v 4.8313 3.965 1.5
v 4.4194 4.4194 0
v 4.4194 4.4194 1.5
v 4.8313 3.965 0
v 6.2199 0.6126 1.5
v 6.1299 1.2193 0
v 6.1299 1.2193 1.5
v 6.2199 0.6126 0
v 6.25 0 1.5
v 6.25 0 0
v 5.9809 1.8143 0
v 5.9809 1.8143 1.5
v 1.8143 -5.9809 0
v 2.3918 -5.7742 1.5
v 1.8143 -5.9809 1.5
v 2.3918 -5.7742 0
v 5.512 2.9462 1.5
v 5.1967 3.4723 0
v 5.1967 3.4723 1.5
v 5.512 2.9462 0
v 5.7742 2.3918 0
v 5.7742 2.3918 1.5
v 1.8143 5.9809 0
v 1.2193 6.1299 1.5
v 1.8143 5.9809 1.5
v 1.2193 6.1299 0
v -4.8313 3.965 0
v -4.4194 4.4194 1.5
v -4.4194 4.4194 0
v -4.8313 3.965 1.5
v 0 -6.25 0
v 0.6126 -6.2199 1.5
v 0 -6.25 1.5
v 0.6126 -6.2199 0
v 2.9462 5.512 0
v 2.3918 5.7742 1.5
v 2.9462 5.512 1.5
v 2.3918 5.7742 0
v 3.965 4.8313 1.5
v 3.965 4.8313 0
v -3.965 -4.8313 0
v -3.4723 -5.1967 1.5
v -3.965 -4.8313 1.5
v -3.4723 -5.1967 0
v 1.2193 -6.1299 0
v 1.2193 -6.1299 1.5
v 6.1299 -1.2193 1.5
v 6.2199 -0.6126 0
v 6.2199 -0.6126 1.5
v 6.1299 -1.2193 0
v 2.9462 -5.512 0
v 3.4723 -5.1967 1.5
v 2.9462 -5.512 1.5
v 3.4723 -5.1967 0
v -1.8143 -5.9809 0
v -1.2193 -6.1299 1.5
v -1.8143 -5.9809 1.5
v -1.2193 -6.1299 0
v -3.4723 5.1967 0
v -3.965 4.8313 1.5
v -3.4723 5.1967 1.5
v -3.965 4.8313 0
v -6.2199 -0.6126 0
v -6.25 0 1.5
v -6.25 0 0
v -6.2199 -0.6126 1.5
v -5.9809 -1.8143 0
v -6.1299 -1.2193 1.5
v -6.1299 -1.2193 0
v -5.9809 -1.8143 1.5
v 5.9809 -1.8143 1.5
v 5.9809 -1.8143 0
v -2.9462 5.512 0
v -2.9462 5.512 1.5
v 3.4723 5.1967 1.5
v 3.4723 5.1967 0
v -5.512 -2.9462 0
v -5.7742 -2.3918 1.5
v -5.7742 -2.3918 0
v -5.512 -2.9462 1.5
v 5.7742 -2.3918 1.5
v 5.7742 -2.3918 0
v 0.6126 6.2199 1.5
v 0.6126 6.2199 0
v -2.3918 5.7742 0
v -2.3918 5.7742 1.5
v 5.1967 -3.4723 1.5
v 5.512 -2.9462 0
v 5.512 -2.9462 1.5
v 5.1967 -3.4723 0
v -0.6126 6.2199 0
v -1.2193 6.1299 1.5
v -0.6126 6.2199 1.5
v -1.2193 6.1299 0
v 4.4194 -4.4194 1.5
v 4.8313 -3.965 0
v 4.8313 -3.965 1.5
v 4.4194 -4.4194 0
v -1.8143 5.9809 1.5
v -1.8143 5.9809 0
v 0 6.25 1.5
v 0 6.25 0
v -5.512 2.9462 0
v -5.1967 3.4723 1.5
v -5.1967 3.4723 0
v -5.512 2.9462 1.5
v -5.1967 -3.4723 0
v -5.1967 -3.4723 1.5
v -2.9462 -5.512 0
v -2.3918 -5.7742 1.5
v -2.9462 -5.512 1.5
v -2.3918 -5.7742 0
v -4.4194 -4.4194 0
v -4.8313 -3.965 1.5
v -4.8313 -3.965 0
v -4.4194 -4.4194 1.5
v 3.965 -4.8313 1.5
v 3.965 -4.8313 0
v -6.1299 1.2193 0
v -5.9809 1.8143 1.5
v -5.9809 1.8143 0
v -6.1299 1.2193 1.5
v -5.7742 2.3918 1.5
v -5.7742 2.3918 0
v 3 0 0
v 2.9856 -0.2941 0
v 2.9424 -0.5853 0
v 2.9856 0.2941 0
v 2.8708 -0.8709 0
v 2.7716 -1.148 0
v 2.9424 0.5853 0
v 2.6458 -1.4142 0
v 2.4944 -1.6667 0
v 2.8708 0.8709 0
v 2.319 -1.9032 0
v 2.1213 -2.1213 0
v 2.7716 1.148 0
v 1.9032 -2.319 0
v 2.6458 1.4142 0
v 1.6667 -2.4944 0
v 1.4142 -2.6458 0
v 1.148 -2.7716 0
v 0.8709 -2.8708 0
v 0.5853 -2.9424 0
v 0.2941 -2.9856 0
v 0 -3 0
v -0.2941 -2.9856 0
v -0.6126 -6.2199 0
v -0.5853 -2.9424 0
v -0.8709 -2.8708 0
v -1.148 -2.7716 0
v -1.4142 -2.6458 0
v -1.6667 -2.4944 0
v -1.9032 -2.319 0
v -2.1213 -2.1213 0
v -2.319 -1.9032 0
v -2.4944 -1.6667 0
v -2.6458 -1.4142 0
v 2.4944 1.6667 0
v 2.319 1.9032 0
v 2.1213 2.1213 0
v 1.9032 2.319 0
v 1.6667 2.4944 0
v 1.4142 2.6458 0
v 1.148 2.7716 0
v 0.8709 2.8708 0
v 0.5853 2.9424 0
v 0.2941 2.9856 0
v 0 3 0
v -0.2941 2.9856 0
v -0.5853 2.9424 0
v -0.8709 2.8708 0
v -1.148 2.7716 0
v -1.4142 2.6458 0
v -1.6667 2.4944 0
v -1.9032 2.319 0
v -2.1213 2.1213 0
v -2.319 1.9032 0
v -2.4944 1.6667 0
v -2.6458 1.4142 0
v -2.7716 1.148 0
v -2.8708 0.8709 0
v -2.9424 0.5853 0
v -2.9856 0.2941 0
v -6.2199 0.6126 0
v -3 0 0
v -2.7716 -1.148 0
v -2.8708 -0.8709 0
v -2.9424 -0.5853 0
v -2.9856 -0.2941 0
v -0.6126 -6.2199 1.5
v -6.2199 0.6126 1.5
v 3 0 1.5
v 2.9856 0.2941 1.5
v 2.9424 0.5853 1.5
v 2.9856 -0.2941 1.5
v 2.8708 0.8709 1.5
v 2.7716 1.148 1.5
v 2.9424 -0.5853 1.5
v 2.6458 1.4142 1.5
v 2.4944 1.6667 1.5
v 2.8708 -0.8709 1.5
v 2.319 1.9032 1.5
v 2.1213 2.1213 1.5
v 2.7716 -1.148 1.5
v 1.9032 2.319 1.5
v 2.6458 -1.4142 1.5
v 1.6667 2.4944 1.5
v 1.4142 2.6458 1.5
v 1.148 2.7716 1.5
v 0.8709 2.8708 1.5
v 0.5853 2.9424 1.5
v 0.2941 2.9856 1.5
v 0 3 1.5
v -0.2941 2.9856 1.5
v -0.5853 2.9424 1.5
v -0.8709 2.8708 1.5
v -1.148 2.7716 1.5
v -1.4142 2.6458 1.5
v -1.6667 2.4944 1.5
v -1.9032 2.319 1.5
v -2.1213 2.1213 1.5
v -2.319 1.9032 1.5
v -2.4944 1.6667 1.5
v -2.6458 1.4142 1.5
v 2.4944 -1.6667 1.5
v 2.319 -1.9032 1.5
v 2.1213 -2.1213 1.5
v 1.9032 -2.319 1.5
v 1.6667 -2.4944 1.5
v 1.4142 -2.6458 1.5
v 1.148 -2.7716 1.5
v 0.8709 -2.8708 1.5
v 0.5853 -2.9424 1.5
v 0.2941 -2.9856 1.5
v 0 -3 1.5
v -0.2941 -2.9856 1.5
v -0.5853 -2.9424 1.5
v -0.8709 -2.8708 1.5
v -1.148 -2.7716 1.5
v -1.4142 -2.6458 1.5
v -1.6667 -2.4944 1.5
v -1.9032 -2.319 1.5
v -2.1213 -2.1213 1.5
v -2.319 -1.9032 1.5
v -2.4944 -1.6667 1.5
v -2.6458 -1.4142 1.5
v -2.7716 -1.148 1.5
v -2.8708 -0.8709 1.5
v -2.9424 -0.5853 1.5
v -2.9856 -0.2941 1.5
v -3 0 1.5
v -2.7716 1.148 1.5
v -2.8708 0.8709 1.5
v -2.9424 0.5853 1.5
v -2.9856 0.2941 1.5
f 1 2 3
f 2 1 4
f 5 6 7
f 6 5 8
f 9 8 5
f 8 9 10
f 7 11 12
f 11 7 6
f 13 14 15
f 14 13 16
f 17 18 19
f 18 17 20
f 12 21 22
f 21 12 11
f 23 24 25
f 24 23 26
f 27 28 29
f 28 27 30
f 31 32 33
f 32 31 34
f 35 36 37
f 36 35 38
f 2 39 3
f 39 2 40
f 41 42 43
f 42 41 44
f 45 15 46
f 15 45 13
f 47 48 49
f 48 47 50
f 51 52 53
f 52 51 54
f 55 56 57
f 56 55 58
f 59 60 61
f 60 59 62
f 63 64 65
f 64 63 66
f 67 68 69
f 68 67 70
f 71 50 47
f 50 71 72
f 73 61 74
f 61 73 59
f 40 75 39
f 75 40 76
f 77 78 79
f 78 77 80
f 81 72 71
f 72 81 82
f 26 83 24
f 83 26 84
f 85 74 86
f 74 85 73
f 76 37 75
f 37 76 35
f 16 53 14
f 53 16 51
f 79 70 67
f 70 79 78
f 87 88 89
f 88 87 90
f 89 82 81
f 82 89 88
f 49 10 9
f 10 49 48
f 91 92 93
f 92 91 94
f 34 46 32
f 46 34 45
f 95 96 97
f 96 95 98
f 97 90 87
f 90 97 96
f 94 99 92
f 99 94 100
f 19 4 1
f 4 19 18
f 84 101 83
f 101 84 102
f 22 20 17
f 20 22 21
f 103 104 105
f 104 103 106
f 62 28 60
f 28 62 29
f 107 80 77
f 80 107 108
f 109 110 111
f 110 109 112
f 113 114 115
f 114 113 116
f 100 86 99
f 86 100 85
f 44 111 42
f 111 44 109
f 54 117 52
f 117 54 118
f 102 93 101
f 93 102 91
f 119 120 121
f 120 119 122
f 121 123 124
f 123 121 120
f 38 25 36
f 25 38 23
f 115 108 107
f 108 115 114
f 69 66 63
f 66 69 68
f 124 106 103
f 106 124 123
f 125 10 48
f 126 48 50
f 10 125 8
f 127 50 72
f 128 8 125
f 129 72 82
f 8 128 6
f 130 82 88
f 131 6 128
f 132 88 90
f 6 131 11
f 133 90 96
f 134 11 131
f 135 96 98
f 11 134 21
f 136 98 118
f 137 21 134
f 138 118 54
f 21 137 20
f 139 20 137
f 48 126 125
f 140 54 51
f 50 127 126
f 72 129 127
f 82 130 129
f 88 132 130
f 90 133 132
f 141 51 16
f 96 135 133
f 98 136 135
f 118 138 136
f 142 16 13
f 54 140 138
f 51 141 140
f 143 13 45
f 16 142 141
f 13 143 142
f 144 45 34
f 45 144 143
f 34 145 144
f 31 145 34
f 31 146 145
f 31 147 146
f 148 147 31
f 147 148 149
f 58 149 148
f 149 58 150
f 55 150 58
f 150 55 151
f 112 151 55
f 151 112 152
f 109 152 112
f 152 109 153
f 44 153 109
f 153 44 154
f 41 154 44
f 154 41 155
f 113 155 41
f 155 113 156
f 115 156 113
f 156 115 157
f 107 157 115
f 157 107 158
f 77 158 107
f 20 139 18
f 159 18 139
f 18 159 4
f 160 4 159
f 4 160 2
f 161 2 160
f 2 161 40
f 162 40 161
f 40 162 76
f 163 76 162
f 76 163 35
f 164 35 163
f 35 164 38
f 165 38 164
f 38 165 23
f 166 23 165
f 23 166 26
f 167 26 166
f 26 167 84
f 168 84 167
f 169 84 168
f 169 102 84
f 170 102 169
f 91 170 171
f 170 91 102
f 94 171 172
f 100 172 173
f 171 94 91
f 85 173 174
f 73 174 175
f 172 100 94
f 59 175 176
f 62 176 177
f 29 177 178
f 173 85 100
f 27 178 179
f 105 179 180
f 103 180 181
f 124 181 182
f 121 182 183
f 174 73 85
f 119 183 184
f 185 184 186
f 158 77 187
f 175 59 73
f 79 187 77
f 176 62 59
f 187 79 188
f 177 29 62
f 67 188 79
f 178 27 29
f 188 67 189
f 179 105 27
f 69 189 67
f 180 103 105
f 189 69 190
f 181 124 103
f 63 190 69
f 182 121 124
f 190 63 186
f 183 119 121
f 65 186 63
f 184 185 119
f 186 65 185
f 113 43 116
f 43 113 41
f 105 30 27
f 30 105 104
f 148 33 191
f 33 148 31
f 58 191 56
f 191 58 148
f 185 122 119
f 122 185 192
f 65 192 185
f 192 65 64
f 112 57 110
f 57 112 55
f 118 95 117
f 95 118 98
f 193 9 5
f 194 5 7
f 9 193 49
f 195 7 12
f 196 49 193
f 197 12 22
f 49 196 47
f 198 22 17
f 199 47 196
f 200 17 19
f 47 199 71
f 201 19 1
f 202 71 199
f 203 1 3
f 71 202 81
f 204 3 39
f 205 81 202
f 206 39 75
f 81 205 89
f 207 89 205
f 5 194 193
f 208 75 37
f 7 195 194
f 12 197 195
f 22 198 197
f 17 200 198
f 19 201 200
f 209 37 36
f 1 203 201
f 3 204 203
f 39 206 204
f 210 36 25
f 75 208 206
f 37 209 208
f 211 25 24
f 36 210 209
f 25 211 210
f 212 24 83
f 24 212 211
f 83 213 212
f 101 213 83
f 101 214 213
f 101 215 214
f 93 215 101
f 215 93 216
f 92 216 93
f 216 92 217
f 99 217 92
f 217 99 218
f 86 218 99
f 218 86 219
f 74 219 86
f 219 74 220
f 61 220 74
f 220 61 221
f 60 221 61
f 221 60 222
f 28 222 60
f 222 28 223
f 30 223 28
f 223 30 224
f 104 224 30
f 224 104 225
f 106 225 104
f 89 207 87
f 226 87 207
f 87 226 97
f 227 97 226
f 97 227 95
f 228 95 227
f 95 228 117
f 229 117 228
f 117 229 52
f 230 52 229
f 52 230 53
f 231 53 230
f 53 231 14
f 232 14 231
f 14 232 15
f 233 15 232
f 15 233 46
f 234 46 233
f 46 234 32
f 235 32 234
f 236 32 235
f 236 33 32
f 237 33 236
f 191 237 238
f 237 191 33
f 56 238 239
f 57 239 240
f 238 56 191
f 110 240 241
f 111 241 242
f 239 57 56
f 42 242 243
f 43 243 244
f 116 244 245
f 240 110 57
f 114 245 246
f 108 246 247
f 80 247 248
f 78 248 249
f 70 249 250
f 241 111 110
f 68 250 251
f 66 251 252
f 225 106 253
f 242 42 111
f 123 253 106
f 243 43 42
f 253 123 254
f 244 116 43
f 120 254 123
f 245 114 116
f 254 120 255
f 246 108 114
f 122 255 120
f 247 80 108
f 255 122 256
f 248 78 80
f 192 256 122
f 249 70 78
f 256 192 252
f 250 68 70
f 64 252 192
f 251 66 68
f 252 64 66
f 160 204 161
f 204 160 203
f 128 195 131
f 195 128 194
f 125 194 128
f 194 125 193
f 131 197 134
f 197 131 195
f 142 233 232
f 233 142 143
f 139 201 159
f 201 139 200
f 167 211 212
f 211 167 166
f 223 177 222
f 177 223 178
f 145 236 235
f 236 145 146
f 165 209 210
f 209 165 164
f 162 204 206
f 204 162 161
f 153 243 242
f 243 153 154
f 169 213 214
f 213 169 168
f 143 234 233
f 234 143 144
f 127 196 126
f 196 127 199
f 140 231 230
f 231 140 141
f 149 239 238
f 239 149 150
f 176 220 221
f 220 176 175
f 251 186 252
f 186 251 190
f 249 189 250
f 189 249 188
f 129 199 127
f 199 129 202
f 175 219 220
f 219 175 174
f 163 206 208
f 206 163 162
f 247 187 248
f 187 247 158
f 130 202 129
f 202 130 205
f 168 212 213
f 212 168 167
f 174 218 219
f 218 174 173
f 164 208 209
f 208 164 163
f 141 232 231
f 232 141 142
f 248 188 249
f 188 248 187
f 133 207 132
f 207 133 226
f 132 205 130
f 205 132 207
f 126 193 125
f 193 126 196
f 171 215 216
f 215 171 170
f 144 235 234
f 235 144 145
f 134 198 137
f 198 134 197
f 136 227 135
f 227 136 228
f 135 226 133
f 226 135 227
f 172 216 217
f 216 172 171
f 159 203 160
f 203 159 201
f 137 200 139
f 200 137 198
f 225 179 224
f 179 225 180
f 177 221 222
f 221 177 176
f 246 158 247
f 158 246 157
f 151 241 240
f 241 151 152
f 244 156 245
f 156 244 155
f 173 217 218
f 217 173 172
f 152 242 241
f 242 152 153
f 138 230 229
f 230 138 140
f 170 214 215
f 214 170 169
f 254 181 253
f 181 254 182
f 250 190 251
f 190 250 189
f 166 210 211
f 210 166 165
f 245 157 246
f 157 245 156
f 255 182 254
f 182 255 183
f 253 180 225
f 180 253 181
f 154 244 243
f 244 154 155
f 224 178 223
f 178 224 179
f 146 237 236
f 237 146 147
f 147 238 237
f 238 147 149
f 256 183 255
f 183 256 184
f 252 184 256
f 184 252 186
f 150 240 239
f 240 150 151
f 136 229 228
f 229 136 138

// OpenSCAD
difference() {
    cylinder(h=1.5, d=12.5, $fn=64);
    translate([0, 0, -0.1])
        cylinder(h=1.7, d=6.0, $fn=64);
}
